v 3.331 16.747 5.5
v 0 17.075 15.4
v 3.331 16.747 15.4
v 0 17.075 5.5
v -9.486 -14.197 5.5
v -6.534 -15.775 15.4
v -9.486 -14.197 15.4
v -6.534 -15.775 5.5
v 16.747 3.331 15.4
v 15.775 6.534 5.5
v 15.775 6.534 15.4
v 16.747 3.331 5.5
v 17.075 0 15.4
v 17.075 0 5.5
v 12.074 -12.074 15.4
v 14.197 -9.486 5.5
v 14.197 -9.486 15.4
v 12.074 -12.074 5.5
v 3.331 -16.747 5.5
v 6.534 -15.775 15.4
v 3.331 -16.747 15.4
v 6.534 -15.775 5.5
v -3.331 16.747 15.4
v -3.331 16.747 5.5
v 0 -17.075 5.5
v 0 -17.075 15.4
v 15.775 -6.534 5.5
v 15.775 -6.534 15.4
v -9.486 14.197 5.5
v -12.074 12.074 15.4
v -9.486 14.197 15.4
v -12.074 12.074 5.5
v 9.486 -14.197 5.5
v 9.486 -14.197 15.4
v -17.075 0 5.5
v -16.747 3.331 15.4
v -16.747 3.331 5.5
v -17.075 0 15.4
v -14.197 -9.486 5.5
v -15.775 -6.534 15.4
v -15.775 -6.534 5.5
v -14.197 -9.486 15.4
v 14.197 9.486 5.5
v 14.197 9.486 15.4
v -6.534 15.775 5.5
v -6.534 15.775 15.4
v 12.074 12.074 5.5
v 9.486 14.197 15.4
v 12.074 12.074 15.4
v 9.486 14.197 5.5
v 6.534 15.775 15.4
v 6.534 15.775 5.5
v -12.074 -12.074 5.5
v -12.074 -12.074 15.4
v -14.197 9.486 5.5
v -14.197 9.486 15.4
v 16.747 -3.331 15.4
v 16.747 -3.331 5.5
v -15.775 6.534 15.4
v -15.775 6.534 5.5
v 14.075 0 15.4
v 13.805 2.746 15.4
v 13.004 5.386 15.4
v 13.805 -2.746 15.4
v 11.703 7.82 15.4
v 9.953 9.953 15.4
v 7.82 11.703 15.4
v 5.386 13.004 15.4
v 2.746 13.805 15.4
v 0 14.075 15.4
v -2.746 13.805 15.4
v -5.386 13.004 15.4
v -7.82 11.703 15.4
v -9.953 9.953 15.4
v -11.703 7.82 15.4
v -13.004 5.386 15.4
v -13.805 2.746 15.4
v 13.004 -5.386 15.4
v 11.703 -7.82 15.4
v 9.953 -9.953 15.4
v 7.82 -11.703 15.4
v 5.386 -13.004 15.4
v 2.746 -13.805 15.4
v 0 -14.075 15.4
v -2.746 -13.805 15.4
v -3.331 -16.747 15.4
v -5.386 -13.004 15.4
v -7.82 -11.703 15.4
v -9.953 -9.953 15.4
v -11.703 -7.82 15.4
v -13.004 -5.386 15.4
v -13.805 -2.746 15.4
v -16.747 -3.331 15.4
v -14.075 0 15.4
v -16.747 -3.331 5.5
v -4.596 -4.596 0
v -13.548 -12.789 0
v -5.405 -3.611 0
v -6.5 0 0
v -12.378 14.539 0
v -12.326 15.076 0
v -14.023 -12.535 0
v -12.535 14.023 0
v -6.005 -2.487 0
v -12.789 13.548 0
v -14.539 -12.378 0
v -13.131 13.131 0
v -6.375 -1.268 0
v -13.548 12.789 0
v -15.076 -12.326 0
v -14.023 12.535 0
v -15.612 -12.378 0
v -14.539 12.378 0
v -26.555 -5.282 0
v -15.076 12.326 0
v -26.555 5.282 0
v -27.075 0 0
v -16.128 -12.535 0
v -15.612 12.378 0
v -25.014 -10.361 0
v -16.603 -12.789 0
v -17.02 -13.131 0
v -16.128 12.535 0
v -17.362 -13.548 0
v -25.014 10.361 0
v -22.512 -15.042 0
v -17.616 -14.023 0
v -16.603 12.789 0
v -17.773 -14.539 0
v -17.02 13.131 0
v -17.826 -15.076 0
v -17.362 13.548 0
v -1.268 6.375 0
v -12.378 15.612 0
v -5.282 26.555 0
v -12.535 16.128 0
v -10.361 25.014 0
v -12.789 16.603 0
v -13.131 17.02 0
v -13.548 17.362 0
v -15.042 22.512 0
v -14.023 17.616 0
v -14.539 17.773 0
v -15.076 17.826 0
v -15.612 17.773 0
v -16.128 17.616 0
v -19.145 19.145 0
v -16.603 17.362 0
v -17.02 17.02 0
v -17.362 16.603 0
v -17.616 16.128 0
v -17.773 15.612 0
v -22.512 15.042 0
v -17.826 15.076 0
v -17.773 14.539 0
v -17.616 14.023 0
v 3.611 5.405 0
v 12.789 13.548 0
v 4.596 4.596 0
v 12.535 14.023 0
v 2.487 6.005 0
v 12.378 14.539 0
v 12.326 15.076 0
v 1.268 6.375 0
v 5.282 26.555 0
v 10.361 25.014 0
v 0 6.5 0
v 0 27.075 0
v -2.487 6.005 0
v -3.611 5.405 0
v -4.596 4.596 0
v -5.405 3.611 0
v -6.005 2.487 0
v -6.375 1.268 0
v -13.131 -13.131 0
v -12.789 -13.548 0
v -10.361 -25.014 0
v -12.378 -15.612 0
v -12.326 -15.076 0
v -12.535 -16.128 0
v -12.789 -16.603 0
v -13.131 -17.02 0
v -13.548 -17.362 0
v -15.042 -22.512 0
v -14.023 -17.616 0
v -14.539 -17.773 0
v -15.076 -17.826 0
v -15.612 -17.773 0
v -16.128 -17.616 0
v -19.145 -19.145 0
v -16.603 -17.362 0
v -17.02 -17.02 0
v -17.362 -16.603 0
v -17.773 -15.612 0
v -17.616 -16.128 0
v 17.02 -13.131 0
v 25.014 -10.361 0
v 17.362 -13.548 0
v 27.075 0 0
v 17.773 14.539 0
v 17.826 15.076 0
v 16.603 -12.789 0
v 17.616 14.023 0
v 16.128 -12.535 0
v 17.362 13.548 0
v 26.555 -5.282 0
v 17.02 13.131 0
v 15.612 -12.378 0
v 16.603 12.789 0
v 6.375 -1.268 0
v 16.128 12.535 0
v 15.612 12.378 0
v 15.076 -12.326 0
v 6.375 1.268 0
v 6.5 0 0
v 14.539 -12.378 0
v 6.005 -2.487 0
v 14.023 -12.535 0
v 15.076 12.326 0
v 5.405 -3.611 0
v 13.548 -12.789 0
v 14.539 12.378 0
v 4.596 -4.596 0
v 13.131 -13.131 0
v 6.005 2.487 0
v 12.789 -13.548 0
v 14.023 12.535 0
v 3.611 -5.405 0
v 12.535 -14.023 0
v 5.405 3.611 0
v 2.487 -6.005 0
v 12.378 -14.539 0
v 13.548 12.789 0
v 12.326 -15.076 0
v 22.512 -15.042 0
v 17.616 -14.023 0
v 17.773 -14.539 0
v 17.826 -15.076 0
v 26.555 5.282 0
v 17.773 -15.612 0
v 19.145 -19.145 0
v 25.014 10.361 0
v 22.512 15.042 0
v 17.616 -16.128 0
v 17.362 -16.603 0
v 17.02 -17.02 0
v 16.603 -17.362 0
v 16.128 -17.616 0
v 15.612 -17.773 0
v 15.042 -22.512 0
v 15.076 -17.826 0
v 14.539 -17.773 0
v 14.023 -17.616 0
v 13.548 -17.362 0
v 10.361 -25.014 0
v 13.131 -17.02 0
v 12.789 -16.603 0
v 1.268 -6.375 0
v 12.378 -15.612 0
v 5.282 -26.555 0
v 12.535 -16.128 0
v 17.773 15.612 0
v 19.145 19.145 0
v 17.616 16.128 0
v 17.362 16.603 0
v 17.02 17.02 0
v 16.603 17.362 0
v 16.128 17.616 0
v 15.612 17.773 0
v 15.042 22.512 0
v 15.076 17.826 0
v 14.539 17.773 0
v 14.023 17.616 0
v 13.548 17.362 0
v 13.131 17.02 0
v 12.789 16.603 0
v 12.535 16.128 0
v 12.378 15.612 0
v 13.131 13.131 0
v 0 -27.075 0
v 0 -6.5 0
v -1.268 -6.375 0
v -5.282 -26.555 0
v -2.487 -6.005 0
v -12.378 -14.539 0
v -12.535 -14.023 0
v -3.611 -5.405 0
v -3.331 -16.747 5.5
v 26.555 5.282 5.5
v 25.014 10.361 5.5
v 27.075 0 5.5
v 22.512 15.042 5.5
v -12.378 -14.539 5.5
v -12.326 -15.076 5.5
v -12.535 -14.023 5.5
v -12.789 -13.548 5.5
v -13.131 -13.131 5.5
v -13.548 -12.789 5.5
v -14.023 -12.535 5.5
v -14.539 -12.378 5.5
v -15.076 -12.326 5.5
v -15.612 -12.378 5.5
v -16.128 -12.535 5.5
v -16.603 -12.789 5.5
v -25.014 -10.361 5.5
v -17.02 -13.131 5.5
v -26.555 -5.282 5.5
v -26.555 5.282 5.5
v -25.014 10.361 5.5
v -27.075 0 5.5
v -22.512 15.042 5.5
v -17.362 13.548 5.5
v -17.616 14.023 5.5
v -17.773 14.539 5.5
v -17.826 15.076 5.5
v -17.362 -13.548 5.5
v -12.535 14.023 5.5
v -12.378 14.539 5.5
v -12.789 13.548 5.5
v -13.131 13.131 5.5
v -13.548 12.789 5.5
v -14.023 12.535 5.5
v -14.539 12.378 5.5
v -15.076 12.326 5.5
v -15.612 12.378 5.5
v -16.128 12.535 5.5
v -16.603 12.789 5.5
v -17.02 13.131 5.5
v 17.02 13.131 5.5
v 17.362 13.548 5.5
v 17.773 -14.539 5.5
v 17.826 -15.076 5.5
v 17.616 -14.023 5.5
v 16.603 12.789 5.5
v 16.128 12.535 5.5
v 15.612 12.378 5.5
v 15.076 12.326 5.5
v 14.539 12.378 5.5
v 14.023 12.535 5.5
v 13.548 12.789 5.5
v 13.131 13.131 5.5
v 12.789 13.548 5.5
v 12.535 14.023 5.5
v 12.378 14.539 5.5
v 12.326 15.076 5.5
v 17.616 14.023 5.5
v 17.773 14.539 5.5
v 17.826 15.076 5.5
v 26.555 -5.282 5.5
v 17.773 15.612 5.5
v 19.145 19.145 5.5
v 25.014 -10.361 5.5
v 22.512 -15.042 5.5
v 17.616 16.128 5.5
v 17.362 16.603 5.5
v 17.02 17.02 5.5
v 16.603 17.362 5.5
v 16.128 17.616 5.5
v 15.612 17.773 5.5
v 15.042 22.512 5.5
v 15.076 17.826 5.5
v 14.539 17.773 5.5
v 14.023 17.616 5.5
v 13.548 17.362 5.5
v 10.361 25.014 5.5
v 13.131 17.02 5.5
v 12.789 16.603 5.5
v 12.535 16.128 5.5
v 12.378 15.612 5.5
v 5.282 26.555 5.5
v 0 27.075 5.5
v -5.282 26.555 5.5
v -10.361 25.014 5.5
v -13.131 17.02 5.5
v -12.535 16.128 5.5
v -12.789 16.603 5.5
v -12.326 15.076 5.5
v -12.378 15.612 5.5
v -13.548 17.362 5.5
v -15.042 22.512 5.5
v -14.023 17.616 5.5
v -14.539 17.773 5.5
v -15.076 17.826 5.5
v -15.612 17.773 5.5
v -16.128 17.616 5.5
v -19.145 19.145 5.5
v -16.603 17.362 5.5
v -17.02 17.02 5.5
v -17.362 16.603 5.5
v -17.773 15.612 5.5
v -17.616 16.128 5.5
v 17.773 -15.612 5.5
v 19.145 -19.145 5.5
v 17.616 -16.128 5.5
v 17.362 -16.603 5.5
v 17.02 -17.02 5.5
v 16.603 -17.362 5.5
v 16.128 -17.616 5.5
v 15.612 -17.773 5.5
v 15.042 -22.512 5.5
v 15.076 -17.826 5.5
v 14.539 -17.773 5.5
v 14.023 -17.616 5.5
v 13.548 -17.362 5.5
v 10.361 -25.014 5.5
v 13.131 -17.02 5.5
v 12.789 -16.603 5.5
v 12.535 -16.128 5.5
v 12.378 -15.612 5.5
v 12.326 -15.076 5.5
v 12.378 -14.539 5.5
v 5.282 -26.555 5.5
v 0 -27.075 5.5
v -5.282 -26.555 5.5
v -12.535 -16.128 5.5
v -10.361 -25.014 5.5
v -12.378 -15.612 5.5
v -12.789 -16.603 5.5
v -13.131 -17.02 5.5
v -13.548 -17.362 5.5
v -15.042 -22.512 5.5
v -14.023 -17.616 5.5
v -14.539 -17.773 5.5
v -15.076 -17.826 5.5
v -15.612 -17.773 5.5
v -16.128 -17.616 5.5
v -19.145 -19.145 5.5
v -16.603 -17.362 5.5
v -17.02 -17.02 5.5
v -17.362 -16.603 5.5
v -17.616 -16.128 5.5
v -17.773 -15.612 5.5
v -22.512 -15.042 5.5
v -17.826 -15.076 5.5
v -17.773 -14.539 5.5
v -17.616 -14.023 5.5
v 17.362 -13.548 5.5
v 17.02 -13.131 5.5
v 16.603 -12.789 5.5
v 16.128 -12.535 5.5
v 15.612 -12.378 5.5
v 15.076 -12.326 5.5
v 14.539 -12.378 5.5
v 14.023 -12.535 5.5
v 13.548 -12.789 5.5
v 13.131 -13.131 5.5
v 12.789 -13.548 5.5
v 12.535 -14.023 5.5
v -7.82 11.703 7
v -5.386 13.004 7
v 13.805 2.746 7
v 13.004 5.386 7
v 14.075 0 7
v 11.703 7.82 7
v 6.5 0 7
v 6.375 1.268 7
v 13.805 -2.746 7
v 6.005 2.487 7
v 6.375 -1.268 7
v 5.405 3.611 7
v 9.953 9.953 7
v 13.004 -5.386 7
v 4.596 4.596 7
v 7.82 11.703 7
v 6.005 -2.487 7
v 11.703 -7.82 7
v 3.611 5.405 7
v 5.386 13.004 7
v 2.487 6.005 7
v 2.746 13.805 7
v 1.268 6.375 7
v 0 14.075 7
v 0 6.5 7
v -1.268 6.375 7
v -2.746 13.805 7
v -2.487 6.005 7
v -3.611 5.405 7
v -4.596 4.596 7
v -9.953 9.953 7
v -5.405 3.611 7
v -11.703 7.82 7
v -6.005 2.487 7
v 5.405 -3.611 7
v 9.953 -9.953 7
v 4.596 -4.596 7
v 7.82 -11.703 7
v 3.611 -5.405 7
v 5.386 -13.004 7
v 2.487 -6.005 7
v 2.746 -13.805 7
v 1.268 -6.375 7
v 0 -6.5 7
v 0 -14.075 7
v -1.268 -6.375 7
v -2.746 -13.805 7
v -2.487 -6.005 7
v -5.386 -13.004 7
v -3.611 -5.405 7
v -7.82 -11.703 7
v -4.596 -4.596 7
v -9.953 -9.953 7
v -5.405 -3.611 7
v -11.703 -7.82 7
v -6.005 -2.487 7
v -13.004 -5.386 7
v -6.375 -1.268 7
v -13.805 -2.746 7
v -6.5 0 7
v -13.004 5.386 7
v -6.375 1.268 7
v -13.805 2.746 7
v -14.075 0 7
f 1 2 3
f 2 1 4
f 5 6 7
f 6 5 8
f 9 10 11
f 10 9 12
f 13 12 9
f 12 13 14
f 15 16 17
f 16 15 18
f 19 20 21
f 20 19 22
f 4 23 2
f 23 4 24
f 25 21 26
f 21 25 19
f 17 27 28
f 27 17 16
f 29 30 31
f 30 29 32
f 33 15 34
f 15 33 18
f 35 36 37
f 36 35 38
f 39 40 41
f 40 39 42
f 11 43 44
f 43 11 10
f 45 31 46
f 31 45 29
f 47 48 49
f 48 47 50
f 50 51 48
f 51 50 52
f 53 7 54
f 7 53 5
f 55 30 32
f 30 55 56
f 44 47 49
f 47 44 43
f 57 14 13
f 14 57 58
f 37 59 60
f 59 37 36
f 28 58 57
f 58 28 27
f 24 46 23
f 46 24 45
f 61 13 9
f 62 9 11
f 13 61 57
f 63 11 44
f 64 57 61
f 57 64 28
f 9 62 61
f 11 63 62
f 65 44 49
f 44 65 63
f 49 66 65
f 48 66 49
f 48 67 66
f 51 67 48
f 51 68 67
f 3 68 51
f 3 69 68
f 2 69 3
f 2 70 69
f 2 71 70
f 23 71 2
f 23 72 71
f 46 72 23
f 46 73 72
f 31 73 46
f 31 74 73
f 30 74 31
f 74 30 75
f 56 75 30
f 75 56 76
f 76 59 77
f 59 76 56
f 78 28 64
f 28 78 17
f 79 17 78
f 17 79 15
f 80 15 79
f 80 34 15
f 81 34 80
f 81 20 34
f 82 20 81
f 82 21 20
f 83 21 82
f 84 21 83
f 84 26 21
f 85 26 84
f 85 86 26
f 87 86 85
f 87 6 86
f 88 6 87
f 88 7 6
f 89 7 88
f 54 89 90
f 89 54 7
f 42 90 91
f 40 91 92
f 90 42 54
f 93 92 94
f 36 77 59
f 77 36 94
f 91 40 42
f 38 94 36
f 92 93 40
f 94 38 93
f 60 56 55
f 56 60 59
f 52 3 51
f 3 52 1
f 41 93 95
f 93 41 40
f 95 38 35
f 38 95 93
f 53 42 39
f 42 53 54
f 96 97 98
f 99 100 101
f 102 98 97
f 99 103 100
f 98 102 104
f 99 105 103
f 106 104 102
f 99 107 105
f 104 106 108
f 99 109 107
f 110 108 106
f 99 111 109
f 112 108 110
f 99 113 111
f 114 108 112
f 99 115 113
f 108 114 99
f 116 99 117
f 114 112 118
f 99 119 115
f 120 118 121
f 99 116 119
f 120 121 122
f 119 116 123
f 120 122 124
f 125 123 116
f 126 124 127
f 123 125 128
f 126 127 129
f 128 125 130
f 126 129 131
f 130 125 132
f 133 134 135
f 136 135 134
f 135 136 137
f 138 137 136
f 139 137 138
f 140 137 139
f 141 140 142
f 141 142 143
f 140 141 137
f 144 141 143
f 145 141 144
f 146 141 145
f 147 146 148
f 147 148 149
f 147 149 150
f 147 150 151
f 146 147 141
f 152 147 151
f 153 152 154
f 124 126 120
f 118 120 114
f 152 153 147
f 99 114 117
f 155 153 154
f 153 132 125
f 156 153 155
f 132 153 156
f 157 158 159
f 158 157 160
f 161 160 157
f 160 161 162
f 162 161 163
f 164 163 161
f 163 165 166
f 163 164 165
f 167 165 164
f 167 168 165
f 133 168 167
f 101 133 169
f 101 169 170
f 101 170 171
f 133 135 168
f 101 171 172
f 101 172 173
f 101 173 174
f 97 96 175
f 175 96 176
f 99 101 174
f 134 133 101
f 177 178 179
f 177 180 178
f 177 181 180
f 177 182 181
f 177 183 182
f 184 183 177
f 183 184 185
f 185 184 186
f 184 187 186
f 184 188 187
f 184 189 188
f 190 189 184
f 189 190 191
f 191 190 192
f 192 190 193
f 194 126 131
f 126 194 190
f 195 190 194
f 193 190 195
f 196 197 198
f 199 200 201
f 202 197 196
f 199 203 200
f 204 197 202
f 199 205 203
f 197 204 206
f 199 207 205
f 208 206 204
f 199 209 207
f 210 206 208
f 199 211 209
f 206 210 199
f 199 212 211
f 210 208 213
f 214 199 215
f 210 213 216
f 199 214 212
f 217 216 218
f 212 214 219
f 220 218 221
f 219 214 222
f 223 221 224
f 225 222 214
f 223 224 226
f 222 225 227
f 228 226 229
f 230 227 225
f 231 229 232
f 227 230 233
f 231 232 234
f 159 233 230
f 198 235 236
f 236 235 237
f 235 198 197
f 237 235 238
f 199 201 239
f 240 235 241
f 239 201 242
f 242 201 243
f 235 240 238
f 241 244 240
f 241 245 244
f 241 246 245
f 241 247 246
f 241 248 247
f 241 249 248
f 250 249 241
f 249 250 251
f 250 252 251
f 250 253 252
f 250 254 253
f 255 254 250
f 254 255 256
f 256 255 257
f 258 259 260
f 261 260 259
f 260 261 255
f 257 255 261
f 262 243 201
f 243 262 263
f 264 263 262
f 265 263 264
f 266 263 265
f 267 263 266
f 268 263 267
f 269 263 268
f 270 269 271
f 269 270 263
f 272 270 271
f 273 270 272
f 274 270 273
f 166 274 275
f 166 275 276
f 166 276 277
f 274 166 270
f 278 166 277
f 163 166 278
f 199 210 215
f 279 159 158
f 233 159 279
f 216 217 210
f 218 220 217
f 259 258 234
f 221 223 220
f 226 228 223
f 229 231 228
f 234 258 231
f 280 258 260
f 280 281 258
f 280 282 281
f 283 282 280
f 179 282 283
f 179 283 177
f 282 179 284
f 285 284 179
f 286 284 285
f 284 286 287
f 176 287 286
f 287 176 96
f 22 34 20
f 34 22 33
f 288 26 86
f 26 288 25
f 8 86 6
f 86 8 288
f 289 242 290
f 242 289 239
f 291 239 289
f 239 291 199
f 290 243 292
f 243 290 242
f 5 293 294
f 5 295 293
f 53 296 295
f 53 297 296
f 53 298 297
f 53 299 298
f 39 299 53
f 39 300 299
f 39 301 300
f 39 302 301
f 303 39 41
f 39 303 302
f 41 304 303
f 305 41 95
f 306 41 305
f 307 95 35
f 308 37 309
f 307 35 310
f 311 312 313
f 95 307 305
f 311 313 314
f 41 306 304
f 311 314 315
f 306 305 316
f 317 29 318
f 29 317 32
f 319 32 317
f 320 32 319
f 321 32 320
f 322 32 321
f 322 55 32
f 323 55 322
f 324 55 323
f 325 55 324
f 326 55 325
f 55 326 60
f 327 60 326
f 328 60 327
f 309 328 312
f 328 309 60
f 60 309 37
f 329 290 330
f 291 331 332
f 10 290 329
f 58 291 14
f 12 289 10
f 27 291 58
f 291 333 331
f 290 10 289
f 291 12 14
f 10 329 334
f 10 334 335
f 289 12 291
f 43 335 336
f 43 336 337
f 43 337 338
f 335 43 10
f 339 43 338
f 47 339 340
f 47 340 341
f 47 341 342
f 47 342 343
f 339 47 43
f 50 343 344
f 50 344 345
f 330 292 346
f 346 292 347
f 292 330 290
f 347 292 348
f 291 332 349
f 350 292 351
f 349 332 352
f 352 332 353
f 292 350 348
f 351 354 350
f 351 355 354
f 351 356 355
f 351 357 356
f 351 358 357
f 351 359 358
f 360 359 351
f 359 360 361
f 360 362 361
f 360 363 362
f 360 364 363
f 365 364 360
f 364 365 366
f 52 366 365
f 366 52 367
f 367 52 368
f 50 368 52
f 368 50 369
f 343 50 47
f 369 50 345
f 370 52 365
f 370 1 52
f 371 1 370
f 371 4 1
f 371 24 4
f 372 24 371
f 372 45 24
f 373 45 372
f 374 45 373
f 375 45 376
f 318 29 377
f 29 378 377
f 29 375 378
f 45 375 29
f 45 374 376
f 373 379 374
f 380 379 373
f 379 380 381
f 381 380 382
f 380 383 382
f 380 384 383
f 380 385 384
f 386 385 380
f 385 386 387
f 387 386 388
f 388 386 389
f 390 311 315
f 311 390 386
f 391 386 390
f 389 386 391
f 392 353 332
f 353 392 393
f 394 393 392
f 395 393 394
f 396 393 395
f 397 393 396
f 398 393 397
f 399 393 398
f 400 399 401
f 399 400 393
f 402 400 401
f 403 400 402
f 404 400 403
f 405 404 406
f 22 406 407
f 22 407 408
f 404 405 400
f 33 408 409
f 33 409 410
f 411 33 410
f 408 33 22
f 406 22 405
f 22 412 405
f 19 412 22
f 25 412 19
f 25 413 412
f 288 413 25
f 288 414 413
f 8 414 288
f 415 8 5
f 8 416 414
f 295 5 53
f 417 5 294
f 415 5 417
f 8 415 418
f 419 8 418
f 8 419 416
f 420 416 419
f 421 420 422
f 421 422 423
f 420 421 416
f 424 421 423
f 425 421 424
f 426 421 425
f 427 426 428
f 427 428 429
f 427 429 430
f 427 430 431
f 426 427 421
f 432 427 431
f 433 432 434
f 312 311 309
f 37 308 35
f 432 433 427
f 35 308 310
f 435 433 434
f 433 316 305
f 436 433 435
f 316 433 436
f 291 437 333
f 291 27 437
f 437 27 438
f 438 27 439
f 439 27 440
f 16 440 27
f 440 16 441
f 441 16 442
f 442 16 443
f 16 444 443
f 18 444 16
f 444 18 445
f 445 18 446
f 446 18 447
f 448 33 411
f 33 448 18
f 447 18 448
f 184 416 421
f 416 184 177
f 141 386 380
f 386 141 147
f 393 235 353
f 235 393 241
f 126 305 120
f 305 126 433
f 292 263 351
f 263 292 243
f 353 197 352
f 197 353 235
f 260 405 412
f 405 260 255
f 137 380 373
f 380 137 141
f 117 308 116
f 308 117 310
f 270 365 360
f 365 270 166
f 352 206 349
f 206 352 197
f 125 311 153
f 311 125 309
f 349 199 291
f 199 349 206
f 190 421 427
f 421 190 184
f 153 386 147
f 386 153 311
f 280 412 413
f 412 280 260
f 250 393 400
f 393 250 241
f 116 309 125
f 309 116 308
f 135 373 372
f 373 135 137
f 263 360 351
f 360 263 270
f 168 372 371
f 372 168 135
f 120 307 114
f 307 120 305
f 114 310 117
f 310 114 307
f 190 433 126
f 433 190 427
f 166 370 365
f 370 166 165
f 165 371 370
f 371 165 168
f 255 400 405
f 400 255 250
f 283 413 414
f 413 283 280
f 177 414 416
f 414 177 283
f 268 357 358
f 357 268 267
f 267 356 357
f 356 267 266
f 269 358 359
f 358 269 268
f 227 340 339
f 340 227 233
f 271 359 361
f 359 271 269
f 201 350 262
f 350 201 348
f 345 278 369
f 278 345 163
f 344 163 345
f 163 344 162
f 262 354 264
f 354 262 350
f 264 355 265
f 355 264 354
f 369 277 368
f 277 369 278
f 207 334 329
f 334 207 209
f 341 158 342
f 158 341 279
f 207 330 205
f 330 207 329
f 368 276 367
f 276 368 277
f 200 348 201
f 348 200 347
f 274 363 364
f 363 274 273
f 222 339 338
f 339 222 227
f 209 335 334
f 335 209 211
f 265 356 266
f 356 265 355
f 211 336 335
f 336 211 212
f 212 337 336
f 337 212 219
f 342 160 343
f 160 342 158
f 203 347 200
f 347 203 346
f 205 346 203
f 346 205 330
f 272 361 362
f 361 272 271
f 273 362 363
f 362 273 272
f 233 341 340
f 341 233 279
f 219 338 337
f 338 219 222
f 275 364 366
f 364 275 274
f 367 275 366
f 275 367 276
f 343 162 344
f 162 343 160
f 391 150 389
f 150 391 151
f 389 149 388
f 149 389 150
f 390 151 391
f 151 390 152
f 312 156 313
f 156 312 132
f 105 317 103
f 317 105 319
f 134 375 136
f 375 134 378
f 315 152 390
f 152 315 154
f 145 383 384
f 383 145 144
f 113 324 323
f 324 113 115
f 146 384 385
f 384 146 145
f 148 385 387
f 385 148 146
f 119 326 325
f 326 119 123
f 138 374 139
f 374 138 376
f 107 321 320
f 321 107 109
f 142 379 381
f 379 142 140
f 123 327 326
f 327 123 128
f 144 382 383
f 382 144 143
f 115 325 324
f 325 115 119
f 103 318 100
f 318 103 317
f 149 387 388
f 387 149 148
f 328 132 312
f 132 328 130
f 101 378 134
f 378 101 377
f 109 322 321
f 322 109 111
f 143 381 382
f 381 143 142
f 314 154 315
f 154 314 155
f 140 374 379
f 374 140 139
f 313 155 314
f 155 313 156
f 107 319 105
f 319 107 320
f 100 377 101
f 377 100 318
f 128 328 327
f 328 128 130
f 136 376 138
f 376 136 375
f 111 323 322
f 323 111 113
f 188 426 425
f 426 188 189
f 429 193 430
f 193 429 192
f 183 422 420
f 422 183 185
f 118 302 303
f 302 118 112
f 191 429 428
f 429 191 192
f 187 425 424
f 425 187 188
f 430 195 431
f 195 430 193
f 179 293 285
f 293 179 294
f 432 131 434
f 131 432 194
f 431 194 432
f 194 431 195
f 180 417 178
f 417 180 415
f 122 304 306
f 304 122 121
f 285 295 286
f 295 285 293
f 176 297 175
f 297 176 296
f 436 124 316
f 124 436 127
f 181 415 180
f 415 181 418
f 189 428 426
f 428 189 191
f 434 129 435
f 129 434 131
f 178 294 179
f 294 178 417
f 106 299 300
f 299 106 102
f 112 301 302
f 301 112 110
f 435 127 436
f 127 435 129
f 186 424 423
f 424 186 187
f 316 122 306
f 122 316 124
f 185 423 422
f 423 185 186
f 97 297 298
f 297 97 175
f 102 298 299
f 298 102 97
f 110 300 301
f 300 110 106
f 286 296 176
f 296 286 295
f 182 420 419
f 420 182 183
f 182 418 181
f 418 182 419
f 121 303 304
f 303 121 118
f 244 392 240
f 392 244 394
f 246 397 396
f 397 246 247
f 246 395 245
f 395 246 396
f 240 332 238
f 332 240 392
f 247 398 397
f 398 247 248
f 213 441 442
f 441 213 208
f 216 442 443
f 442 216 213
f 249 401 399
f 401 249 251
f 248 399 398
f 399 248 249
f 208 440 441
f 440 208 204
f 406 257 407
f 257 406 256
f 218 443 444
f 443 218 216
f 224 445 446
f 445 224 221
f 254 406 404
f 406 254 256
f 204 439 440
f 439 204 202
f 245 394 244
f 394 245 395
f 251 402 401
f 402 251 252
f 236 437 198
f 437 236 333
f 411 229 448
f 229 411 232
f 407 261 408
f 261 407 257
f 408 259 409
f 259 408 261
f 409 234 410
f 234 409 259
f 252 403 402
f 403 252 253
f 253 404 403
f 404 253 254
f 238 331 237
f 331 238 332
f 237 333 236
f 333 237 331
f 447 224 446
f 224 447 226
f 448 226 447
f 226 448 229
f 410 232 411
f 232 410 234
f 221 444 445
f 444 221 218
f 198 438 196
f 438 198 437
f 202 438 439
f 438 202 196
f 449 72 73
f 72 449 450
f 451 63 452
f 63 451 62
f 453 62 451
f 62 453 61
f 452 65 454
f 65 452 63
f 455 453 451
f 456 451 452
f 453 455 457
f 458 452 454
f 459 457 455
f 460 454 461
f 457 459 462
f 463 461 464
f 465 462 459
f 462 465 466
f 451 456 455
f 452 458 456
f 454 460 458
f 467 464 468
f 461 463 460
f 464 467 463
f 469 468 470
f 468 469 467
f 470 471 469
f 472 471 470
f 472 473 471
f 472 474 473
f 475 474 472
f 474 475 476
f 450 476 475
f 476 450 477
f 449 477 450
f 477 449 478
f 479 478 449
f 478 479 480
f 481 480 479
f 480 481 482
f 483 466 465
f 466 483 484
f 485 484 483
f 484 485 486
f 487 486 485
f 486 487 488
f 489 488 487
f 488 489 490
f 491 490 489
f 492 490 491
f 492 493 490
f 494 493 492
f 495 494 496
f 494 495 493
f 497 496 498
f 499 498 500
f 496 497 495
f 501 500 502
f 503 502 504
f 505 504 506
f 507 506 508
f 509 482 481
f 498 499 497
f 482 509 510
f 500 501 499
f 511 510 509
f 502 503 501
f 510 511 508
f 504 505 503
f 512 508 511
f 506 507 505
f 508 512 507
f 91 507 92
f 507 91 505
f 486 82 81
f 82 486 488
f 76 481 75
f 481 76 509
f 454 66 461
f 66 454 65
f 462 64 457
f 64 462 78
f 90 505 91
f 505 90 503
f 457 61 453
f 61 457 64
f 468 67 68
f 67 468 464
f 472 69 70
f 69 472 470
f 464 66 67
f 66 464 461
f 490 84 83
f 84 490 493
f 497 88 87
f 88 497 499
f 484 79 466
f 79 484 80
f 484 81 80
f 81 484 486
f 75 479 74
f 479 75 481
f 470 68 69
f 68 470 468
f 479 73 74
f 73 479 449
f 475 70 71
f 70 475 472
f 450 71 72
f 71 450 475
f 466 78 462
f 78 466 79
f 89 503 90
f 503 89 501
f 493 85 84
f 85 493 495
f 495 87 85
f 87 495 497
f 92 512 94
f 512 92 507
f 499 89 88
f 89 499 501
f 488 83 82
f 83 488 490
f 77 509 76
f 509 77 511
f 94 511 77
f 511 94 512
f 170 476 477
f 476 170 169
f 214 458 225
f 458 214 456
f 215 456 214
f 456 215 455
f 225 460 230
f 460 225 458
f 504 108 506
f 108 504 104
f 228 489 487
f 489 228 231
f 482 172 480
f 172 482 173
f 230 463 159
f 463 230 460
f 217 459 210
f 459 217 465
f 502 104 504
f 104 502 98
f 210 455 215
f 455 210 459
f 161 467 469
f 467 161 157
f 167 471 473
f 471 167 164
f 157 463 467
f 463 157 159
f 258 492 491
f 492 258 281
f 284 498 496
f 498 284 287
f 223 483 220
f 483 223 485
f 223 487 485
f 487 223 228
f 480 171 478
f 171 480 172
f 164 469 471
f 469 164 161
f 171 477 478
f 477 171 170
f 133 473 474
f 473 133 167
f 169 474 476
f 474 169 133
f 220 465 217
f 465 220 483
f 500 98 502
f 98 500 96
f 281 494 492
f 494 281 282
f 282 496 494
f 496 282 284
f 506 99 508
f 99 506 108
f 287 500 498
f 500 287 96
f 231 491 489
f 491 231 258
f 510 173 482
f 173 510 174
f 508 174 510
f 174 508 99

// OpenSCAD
$fn = 32;

// ----------------------------------------------------------------------
// Bearing housing: seat for 6001 (28 x 8 mm), 34.15 mm body
// ----------------------------------------------------------------------

// --- parameters (mm) ---
housing_d = 34.15;        // housing outside diameter
housing_h = 15.4;         // overall housing height
wall_t = 3;               // wall thickness
seat_d = 28.15;           // 6001 seat, 0.15 mm clearance
seat_h = 8.4;             // pocket depth
shoulder = 3;             // shoulder under the bearing
pass_d = 13;              // shaft passage
flange_d = 54.15;         // mounting flange diameter
flange_t = 4;             // flange thickness
bolt_d = 5.5;             // flange bolt clearance
bolt_r = 21.32;           // flange bolt circle radius

module body() {
  cylinder(h = housing_h, d = housing_d);
}

module flange() {
  /* flange sunk 1.5 mm into the body */
  cylinder(h = flange_t + 1.5, d = flange_d);
}

difference() {
  union() {
    body();
    flange();
  }
  translate([0, 0, housing_h - seat_h]) cylinder(h = seat_h + 1, d = seat_d);
  translate([0, 0, -1]) cylinder(h = housing_h - seat_h + 1, d = pass_d);
  for (i = [0 : 3]) rotate([0, 0, 45 + i * 90]) translate([bolt_r, 0, -1])
    cylinder(h = flange_t + 3, d = bolt_d);
}
